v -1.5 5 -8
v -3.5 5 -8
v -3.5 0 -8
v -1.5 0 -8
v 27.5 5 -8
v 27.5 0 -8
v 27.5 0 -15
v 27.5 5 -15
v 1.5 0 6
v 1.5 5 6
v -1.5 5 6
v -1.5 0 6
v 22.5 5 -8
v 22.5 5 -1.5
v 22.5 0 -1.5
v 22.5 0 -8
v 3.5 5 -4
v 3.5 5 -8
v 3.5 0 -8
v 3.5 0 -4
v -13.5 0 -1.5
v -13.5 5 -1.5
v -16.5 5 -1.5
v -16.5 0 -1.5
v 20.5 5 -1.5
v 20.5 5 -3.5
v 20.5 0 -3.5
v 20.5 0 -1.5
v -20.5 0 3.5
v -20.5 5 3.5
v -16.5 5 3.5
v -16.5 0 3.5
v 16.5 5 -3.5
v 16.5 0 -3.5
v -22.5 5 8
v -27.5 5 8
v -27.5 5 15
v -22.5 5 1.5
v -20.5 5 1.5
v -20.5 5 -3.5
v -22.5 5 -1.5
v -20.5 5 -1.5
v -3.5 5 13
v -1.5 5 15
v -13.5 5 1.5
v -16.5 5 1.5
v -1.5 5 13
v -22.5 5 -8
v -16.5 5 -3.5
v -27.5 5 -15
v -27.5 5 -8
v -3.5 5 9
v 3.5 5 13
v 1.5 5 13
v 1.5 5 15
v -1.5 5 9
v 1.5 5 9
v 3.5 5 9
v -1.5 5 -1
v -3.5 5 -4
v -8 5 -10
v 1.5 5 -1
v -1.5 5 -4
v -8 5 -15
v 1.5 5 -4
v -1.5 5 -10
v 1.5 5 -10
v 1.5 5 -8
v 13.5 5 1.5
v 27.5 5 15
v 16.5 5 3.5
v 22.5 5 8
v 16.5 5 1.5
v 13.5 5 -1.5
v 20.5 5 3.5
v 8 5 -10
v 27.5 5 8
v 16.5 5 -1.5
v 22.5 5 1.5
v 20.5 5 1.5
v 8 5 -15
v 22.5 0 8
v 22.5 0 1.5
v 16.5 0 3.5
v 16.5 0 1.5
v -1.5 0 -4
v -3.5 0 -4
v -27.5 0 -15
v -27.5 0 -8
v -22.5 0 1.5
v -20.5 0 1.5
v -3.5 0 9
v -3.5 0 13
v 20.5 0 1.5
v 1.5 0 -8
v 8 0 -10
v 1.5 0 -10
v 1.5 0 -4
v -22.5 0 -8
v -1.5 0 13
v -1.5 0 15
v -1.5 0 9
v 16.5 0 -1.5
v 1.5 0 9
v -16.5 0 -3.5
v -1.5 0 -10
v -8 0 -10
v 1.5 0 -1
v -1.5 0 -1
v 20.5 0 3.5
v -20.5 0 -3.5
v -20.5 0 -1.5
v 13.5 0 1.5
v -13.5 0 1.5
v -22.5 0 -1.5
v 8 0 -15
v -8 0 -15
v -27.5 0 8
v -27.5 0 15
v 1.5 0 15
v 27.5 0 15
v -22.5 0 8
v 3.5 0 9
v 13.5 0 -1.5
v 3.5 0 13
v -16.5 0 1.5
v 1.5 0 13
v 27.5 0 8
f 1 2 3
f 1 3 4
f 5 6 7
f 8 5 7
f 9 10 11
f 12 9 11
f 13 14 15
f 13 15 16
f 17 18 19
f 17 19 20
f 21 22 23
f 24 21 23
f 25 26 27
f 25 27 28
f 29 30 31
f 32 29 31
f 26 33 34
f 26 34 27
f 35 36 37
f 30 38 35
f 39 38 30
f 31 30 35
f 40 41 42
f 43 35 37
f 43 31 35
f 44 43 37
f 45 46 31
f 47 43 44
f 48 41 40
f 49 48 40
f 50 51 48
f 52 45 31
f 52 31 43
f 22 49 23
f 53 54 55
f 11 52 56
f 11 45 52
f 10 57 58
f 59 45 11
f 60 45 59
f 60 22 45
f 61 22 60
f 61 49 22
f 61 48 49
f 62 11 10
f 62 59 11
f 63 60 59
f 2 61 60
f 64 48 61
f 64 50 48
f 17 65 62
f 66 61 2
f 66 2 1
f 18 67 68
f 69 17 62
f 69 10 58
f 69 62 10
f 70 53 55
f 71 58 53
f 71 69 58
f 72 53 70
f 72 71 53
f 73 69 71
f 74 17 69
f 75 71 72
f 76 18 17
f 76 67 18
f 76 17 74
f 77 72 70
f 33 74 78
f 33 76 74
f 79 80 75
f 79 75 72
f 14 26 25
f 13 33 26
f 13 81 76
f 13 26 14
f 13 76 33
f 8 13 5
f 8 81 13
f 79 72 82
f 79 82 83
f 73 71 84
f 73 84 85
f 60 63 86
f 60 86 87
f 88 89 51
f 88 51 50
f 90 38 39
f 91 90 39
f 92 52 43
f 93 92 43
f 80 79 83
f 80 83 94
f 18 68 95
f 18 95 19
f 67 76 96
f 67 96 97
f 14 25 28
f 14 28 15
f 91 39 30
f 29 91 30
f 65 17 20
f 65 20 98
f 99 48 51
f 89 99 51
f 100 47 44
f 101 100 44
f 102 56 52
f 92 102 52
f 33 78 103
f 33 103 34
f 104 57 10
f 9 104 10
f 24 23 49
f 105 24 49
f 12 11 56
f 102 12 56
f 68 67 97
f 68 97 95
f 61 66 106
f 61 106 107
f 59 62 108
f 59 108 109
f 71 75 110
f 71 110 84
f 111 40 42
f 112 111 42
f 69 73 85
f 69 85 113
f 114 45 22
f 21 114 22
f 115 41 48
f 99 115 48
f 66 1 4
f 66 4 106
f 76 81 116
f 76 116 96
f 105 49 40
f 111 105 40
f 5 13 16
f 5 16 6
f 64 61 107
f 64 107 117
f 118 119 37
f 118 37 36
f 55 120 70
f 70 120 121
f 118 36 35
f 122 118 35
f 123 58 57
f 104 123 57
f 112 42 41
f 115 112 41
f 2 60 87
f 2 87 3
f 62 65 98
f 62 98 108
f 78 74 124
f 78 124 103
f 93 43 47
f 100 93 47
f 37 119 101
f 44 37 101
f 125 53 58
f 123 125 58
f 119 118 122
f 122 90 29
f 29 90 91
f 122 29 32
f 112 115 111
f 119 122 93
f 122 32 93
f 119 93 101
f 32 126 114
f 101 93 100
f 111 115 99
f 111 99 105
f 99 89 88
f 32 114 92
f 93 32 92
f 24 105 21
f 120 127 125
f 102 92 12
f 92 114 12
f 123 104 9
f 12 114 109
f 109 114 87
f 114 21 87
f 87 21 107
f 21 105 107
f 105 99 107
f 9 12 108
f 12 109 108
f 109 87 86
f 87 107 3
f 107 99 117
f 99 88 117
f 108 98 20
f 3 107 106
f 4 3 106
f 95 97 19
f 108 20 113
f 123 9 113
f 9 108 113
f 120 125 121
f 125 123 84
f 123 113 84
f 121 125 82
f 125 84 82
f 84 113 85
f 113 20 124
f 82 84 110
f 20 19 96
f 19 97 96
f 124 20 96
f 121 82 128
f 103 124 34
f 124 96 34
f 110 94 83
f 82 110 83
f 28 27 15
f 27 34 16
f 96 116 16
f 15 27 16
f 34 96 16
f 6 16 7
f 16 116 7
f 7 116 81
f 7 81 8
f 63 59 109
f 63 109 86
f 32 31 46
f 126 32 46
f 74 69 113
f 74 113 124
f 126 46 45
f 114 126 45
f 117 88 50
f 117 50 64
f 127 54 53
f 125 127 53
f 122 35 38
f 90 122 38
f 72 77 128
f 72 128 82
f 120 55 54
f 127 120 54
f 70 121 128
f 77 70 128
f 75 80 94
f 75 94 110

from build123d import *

# Parameters (mm, degrees)
CROQUIS1_W              = 55
CROQUIS1_H              = 30
SALIENTE_EXTRUIR1_DEPTH = 5
CORTAR_EXTRUIR1_DEPTH   = 32.721443851
CORTAR_EXTRUIR2_DEPTH   = 32.721443851
CORTAR_EXTRUIR3_DEPTH   = 32.721443851


with BuildPart() as part:
    # Croquis1 → Saliente-Extruir1 (new body)
    with BuildSketch(Plane(origin=(0, 0, 0), x_dir=(1, 0, 0), z_dir=(0, 1, 0))):
        Rectangle(CROQUIS1_W, CROQUIS1_H)
    extrude(amount=SALIENTE_EXTRUIR1_DEPTH)

    # Croquis2 → Cortar-Extruir1 (cut, through all)
    with BuildSketch(Plane(origin=(0, 5, 0), x_dir=(1, 0, 0), z_dir=(0, 1, 0))):
        Polygon((-22.5, 8), (-27.5, 8), (-27.5, -8), (-22.5, -8), (-22.5, -1.5), (-20.5, -1.5), (-20.5, -3.5), (-16.5, -3.5), (-16.5, -1.5), (-13.5, -1.5), (-13.5, 1.5), (-16.5, 1.5), (-16.5, 3.5), (-20.5, 3.5), (-20.5, 1.5), (-22.5, 1.5), align=None)
    cortar_extruir1 = extrude(amount=-CORTAR_EXTRUIR1_DEPTH, mode=Mode.SUBTRACT)

    # Simetría1: Cortar-Extruir1 across plane
    add(cortar_extruir1.mirror(Plane(origin=(0, 0, 0), x_dir=(0, 0, 1), z_dir=(1, 0, 0))), mode=Mode.SUBTRACT)

    # Croquis3 → Cortar-Extruir2 (cut, through all)
    with BuildSketch(Plane(origin=(0, 5, 0), x_dir=(1, 0, 0), z_dir=(0, 1, 0))):
        Polygon((-8, 15), (8, 15), (8, 10), (1.5, 10), (1.5, 8), (3.5, 8), (3.5, 4), (1.5, 4), (1.5, 1), (-1.5, 1), (-1.5, 4), (-3.5, 4), (-3.5, 8), (-1.5, 8), (-1.5, 10), (-8, 10), align=None)
    extrude(amount=-CORTAR_EXTRUIR2_DEPTH, mode=Mode.SUBTRACT)

    # Croquis4 → Cortar-Extruir3 (cut, through all)
    with BuildSketch(Plane(origin=(0, 5, 0), x_dir=(1, 0, 0), z_dir=(0, 1, 0))):
        Polygon((1.5, -15), (1.5, -13), (3.5, -13), (3.5, -9), (1.5, -9), (1.5, -6), (-1.5, -6), (-1.5, -9), (-3.5, -9), (-3.5, -13), (-1.5, -13), (-1.5, -15), align=None)
    extrude(amount=-CORTAR_EXTRUIR3_DEPTH, mode=Mode.SUBTRACT)


solid = part.part
